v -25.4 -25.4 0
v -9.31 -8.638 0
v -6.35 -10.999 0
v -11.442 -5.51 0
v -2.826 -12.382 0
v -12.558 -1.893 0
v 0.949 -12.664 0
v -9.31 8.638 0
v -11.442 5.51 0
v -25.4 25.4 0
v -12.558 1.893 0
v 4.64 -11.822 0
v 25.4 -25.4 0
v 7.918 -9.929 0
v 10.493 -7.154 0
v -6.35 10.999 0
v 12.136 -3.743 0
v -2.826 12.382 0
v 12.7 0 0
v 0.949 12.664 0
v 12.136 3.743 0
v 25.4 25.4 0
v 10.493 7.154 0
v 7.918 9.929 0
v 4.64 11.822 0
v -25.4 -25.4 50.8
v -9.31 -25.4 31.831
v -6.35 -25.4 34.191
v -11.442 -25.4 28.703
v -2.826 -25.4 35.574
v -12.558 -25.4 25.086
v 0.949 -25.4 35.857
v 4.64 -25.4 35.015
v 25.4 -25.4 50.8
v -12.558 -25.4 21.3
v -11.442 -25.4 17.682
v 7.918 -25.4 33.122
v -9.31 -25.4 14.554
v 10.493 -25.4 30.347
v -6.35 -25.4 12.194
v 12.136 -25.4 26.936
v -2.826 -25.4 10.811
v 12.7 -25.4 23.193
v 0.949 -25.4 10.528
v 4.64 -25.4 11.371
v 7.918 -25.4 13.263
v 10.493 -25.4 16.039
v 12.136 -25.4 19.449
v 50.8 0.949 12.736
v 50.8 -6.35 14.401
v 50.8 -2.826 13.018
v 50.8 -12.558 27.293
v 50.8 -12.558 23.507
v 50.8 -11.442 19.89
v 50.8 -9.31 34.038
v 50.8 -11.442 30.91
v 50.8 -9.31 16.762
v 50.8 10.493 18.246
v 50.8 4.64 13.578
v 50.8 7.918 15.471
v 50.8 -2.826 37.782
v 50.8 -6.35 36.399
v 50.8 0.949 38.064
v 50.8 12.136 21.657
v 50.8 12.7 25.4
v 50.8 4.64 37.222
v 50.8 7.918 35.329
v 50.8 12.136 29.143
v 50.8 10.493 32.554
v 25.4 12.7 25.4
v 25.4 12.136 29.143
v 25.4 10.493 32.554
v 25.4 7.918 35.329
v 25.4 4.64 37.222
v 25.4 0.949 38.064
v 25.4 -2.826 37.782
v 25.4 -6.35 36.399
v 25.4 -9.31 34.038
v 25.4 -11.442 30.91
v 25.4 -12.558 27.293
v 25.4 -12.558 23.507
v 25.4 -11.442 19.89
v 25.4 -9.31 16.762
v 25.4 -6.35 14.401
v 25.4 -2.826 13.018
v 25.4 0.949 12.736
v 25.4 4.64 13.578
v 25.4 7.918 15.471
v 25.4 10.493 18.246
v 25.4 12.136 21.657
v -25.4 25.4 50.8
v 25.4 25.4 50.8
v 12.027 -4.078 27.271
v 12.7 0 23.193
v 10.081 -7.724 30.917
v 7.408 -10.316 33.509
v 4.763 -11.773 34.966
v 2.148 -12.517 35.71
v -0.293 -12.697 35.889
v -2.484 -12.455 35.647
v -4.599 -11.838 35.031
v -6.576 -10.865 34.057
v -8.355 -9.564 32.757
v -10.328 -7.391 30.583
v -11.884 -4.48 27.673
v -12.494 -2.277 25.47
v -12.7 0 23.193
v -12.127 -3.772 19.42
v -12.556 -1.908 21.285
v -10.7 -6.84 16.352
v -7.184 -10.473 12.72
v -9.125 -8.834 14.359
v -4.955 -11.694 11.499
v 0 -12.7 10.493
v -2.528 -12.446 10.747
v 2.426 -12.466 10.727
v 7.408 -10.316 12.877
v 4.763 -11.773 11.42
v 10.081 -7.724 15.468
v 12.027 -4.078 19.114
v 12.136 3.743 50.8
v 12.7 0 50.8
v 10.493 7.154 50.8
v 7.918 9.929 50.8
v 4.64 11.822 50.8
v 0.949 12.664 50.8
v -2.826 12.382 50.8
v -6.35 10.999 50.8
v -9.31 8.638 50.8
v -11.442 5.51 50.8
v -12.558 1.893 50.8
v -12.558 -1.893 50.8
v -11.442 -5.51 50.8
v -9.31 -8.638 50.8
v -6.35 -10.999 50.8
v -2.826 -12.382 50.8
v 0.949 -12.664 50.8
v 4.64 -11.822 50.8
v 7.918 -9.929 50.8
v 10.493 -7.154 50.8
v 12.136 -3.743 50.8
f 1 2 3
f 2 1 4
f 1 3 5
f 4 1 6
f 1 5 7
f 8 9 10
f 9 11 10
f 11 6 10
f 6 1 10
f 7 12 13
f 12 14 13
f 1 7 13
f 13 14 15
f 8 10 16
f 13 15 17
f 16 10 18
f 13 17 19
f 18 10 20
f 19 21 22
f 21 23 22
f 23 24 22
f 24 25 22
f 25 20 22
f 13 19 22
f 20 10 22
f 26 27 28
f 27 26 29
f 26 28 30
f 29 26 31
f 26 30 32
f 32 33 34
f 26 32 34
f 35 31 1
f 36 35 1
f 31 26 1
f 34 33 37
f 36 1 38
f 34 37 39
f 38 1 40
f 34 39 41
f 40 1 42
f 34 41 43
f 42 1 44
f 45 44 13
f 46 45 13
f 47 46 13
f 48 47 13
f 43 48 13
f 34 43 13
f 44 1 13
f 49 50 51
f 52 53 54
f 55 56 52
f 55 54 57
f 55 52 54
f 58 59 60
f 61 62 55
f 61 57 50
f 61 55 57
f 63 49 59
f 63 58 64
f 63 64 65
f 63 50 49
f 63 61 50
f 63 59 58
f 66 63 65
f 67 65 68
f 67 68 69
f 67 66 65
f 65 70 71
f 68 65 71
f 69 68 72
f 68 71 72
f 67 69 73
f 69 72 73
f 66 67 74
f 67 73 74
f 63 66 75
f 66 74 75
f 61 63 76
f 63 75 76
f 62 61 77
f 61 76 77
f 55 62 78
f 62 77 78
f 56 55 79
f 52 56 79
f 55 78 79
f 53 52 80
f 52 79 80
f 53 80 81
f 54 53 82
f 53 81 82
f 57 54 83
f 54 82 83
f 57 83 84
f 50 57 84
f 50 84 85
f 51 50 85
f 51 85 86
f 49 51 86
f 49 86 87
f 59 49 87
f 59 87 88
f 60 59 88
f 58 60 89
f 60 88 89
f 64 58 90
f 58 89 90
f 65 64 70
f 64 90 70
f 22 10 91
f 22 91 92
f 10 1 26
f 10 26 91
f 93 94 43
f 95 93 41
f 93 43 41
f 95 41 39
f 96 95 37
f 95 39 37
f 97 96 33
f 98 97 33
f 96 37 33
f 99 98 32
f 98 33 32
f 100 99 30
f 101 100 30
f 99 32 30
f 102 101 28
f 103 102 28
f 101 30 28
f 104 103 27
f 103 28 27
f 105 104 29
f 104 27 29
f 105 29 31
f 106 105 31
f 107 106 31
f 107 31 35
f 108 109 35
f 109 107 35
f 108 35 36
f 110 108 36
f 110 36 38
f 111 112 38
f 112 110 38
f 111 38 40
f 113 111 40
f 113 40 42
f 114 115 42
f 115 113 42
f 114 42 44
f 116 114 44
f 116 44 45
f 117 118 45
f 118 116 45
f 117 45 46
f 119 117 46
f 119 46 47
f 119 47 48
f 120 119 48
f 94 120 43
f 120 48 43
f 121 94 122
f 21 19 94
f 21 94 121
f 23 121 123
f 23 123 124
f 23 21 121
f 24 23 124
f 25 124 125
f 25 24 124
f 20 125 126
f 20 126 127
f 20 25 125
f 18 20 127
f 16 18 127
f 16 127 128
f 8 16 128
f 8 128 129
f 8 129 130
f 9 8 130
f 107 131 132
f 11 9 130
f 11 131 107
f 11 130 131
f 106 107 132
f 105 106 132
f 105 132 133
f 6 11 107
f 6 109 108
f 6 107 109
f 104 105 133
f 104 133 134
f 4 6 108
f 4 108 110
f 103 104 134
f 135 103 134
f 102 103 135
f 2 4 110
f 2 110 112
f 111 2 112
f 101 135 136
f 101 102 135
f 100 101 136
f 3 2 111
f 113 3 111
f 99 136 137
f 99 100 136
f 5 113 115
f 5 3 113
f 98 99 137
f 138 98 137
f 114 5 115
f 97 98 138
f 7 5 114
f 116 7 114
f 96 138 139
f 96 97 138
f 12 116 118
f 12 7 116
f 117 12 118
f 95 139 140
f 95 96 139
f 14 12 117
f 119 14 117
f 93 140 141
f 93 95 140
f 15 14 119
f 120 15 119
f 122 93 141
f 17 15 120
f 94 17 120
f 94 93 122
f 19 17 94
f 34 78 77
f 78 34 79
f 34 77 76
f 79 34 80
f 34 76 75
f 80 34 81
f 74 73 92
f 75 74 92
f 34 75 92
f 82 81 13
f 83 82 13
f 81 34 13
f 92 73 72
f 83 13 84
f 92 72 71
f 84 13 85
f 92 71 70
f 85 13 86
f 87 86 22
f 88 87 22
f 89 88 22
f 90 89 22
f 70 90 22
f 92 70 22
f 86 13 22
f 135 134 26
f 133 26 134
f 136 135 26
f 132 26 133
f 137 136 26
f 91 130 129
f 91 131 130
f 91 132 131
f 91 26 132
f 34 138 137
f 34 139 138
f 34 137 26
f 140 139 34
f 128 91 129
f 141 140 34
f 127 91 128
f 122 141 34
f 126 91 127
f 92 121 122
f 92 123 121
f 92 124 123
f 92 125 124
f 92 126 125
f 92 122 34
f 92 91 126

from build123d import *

# Parameters (mm, degrees)
F0_W     = 50.8
F0_H     = 50.8
F0_R     = 12.7
F1_DEPTH = 50.8
F2_R     = 12.7
F3_DEPTH = 25.4
F4_R     = 12.7
F5_DEPTH = 25.4


with BuildPart() as f1:
    # F0 (on Top) → F1 (new body)
    with BuildSketch(Plane.XY):
        Rectangle(F0_W, F0_H)
        Circle(F0_R, mode=Mode.SUBTRACT)
    extrude(amount=F1_DEPTH)

    # F2 (on face) → F3 (cut)
    with BuildSketch(Plane.XZ.offset(25.4)):
        with Locations((0, 23.192675)):
            Circle(F2_R)
    extrude(amount=-F3_DEPTH, mode=Mode.SUBTRACT)

    # F4 (on face) → F5 (join)
    with BuildSketch(Plane.YZ.offset(25.4)):
        with Locations((0, 25.4)):
            Circle(F4_R)
    extrude(amount=F5_DEPTH)


solid = f1.part
